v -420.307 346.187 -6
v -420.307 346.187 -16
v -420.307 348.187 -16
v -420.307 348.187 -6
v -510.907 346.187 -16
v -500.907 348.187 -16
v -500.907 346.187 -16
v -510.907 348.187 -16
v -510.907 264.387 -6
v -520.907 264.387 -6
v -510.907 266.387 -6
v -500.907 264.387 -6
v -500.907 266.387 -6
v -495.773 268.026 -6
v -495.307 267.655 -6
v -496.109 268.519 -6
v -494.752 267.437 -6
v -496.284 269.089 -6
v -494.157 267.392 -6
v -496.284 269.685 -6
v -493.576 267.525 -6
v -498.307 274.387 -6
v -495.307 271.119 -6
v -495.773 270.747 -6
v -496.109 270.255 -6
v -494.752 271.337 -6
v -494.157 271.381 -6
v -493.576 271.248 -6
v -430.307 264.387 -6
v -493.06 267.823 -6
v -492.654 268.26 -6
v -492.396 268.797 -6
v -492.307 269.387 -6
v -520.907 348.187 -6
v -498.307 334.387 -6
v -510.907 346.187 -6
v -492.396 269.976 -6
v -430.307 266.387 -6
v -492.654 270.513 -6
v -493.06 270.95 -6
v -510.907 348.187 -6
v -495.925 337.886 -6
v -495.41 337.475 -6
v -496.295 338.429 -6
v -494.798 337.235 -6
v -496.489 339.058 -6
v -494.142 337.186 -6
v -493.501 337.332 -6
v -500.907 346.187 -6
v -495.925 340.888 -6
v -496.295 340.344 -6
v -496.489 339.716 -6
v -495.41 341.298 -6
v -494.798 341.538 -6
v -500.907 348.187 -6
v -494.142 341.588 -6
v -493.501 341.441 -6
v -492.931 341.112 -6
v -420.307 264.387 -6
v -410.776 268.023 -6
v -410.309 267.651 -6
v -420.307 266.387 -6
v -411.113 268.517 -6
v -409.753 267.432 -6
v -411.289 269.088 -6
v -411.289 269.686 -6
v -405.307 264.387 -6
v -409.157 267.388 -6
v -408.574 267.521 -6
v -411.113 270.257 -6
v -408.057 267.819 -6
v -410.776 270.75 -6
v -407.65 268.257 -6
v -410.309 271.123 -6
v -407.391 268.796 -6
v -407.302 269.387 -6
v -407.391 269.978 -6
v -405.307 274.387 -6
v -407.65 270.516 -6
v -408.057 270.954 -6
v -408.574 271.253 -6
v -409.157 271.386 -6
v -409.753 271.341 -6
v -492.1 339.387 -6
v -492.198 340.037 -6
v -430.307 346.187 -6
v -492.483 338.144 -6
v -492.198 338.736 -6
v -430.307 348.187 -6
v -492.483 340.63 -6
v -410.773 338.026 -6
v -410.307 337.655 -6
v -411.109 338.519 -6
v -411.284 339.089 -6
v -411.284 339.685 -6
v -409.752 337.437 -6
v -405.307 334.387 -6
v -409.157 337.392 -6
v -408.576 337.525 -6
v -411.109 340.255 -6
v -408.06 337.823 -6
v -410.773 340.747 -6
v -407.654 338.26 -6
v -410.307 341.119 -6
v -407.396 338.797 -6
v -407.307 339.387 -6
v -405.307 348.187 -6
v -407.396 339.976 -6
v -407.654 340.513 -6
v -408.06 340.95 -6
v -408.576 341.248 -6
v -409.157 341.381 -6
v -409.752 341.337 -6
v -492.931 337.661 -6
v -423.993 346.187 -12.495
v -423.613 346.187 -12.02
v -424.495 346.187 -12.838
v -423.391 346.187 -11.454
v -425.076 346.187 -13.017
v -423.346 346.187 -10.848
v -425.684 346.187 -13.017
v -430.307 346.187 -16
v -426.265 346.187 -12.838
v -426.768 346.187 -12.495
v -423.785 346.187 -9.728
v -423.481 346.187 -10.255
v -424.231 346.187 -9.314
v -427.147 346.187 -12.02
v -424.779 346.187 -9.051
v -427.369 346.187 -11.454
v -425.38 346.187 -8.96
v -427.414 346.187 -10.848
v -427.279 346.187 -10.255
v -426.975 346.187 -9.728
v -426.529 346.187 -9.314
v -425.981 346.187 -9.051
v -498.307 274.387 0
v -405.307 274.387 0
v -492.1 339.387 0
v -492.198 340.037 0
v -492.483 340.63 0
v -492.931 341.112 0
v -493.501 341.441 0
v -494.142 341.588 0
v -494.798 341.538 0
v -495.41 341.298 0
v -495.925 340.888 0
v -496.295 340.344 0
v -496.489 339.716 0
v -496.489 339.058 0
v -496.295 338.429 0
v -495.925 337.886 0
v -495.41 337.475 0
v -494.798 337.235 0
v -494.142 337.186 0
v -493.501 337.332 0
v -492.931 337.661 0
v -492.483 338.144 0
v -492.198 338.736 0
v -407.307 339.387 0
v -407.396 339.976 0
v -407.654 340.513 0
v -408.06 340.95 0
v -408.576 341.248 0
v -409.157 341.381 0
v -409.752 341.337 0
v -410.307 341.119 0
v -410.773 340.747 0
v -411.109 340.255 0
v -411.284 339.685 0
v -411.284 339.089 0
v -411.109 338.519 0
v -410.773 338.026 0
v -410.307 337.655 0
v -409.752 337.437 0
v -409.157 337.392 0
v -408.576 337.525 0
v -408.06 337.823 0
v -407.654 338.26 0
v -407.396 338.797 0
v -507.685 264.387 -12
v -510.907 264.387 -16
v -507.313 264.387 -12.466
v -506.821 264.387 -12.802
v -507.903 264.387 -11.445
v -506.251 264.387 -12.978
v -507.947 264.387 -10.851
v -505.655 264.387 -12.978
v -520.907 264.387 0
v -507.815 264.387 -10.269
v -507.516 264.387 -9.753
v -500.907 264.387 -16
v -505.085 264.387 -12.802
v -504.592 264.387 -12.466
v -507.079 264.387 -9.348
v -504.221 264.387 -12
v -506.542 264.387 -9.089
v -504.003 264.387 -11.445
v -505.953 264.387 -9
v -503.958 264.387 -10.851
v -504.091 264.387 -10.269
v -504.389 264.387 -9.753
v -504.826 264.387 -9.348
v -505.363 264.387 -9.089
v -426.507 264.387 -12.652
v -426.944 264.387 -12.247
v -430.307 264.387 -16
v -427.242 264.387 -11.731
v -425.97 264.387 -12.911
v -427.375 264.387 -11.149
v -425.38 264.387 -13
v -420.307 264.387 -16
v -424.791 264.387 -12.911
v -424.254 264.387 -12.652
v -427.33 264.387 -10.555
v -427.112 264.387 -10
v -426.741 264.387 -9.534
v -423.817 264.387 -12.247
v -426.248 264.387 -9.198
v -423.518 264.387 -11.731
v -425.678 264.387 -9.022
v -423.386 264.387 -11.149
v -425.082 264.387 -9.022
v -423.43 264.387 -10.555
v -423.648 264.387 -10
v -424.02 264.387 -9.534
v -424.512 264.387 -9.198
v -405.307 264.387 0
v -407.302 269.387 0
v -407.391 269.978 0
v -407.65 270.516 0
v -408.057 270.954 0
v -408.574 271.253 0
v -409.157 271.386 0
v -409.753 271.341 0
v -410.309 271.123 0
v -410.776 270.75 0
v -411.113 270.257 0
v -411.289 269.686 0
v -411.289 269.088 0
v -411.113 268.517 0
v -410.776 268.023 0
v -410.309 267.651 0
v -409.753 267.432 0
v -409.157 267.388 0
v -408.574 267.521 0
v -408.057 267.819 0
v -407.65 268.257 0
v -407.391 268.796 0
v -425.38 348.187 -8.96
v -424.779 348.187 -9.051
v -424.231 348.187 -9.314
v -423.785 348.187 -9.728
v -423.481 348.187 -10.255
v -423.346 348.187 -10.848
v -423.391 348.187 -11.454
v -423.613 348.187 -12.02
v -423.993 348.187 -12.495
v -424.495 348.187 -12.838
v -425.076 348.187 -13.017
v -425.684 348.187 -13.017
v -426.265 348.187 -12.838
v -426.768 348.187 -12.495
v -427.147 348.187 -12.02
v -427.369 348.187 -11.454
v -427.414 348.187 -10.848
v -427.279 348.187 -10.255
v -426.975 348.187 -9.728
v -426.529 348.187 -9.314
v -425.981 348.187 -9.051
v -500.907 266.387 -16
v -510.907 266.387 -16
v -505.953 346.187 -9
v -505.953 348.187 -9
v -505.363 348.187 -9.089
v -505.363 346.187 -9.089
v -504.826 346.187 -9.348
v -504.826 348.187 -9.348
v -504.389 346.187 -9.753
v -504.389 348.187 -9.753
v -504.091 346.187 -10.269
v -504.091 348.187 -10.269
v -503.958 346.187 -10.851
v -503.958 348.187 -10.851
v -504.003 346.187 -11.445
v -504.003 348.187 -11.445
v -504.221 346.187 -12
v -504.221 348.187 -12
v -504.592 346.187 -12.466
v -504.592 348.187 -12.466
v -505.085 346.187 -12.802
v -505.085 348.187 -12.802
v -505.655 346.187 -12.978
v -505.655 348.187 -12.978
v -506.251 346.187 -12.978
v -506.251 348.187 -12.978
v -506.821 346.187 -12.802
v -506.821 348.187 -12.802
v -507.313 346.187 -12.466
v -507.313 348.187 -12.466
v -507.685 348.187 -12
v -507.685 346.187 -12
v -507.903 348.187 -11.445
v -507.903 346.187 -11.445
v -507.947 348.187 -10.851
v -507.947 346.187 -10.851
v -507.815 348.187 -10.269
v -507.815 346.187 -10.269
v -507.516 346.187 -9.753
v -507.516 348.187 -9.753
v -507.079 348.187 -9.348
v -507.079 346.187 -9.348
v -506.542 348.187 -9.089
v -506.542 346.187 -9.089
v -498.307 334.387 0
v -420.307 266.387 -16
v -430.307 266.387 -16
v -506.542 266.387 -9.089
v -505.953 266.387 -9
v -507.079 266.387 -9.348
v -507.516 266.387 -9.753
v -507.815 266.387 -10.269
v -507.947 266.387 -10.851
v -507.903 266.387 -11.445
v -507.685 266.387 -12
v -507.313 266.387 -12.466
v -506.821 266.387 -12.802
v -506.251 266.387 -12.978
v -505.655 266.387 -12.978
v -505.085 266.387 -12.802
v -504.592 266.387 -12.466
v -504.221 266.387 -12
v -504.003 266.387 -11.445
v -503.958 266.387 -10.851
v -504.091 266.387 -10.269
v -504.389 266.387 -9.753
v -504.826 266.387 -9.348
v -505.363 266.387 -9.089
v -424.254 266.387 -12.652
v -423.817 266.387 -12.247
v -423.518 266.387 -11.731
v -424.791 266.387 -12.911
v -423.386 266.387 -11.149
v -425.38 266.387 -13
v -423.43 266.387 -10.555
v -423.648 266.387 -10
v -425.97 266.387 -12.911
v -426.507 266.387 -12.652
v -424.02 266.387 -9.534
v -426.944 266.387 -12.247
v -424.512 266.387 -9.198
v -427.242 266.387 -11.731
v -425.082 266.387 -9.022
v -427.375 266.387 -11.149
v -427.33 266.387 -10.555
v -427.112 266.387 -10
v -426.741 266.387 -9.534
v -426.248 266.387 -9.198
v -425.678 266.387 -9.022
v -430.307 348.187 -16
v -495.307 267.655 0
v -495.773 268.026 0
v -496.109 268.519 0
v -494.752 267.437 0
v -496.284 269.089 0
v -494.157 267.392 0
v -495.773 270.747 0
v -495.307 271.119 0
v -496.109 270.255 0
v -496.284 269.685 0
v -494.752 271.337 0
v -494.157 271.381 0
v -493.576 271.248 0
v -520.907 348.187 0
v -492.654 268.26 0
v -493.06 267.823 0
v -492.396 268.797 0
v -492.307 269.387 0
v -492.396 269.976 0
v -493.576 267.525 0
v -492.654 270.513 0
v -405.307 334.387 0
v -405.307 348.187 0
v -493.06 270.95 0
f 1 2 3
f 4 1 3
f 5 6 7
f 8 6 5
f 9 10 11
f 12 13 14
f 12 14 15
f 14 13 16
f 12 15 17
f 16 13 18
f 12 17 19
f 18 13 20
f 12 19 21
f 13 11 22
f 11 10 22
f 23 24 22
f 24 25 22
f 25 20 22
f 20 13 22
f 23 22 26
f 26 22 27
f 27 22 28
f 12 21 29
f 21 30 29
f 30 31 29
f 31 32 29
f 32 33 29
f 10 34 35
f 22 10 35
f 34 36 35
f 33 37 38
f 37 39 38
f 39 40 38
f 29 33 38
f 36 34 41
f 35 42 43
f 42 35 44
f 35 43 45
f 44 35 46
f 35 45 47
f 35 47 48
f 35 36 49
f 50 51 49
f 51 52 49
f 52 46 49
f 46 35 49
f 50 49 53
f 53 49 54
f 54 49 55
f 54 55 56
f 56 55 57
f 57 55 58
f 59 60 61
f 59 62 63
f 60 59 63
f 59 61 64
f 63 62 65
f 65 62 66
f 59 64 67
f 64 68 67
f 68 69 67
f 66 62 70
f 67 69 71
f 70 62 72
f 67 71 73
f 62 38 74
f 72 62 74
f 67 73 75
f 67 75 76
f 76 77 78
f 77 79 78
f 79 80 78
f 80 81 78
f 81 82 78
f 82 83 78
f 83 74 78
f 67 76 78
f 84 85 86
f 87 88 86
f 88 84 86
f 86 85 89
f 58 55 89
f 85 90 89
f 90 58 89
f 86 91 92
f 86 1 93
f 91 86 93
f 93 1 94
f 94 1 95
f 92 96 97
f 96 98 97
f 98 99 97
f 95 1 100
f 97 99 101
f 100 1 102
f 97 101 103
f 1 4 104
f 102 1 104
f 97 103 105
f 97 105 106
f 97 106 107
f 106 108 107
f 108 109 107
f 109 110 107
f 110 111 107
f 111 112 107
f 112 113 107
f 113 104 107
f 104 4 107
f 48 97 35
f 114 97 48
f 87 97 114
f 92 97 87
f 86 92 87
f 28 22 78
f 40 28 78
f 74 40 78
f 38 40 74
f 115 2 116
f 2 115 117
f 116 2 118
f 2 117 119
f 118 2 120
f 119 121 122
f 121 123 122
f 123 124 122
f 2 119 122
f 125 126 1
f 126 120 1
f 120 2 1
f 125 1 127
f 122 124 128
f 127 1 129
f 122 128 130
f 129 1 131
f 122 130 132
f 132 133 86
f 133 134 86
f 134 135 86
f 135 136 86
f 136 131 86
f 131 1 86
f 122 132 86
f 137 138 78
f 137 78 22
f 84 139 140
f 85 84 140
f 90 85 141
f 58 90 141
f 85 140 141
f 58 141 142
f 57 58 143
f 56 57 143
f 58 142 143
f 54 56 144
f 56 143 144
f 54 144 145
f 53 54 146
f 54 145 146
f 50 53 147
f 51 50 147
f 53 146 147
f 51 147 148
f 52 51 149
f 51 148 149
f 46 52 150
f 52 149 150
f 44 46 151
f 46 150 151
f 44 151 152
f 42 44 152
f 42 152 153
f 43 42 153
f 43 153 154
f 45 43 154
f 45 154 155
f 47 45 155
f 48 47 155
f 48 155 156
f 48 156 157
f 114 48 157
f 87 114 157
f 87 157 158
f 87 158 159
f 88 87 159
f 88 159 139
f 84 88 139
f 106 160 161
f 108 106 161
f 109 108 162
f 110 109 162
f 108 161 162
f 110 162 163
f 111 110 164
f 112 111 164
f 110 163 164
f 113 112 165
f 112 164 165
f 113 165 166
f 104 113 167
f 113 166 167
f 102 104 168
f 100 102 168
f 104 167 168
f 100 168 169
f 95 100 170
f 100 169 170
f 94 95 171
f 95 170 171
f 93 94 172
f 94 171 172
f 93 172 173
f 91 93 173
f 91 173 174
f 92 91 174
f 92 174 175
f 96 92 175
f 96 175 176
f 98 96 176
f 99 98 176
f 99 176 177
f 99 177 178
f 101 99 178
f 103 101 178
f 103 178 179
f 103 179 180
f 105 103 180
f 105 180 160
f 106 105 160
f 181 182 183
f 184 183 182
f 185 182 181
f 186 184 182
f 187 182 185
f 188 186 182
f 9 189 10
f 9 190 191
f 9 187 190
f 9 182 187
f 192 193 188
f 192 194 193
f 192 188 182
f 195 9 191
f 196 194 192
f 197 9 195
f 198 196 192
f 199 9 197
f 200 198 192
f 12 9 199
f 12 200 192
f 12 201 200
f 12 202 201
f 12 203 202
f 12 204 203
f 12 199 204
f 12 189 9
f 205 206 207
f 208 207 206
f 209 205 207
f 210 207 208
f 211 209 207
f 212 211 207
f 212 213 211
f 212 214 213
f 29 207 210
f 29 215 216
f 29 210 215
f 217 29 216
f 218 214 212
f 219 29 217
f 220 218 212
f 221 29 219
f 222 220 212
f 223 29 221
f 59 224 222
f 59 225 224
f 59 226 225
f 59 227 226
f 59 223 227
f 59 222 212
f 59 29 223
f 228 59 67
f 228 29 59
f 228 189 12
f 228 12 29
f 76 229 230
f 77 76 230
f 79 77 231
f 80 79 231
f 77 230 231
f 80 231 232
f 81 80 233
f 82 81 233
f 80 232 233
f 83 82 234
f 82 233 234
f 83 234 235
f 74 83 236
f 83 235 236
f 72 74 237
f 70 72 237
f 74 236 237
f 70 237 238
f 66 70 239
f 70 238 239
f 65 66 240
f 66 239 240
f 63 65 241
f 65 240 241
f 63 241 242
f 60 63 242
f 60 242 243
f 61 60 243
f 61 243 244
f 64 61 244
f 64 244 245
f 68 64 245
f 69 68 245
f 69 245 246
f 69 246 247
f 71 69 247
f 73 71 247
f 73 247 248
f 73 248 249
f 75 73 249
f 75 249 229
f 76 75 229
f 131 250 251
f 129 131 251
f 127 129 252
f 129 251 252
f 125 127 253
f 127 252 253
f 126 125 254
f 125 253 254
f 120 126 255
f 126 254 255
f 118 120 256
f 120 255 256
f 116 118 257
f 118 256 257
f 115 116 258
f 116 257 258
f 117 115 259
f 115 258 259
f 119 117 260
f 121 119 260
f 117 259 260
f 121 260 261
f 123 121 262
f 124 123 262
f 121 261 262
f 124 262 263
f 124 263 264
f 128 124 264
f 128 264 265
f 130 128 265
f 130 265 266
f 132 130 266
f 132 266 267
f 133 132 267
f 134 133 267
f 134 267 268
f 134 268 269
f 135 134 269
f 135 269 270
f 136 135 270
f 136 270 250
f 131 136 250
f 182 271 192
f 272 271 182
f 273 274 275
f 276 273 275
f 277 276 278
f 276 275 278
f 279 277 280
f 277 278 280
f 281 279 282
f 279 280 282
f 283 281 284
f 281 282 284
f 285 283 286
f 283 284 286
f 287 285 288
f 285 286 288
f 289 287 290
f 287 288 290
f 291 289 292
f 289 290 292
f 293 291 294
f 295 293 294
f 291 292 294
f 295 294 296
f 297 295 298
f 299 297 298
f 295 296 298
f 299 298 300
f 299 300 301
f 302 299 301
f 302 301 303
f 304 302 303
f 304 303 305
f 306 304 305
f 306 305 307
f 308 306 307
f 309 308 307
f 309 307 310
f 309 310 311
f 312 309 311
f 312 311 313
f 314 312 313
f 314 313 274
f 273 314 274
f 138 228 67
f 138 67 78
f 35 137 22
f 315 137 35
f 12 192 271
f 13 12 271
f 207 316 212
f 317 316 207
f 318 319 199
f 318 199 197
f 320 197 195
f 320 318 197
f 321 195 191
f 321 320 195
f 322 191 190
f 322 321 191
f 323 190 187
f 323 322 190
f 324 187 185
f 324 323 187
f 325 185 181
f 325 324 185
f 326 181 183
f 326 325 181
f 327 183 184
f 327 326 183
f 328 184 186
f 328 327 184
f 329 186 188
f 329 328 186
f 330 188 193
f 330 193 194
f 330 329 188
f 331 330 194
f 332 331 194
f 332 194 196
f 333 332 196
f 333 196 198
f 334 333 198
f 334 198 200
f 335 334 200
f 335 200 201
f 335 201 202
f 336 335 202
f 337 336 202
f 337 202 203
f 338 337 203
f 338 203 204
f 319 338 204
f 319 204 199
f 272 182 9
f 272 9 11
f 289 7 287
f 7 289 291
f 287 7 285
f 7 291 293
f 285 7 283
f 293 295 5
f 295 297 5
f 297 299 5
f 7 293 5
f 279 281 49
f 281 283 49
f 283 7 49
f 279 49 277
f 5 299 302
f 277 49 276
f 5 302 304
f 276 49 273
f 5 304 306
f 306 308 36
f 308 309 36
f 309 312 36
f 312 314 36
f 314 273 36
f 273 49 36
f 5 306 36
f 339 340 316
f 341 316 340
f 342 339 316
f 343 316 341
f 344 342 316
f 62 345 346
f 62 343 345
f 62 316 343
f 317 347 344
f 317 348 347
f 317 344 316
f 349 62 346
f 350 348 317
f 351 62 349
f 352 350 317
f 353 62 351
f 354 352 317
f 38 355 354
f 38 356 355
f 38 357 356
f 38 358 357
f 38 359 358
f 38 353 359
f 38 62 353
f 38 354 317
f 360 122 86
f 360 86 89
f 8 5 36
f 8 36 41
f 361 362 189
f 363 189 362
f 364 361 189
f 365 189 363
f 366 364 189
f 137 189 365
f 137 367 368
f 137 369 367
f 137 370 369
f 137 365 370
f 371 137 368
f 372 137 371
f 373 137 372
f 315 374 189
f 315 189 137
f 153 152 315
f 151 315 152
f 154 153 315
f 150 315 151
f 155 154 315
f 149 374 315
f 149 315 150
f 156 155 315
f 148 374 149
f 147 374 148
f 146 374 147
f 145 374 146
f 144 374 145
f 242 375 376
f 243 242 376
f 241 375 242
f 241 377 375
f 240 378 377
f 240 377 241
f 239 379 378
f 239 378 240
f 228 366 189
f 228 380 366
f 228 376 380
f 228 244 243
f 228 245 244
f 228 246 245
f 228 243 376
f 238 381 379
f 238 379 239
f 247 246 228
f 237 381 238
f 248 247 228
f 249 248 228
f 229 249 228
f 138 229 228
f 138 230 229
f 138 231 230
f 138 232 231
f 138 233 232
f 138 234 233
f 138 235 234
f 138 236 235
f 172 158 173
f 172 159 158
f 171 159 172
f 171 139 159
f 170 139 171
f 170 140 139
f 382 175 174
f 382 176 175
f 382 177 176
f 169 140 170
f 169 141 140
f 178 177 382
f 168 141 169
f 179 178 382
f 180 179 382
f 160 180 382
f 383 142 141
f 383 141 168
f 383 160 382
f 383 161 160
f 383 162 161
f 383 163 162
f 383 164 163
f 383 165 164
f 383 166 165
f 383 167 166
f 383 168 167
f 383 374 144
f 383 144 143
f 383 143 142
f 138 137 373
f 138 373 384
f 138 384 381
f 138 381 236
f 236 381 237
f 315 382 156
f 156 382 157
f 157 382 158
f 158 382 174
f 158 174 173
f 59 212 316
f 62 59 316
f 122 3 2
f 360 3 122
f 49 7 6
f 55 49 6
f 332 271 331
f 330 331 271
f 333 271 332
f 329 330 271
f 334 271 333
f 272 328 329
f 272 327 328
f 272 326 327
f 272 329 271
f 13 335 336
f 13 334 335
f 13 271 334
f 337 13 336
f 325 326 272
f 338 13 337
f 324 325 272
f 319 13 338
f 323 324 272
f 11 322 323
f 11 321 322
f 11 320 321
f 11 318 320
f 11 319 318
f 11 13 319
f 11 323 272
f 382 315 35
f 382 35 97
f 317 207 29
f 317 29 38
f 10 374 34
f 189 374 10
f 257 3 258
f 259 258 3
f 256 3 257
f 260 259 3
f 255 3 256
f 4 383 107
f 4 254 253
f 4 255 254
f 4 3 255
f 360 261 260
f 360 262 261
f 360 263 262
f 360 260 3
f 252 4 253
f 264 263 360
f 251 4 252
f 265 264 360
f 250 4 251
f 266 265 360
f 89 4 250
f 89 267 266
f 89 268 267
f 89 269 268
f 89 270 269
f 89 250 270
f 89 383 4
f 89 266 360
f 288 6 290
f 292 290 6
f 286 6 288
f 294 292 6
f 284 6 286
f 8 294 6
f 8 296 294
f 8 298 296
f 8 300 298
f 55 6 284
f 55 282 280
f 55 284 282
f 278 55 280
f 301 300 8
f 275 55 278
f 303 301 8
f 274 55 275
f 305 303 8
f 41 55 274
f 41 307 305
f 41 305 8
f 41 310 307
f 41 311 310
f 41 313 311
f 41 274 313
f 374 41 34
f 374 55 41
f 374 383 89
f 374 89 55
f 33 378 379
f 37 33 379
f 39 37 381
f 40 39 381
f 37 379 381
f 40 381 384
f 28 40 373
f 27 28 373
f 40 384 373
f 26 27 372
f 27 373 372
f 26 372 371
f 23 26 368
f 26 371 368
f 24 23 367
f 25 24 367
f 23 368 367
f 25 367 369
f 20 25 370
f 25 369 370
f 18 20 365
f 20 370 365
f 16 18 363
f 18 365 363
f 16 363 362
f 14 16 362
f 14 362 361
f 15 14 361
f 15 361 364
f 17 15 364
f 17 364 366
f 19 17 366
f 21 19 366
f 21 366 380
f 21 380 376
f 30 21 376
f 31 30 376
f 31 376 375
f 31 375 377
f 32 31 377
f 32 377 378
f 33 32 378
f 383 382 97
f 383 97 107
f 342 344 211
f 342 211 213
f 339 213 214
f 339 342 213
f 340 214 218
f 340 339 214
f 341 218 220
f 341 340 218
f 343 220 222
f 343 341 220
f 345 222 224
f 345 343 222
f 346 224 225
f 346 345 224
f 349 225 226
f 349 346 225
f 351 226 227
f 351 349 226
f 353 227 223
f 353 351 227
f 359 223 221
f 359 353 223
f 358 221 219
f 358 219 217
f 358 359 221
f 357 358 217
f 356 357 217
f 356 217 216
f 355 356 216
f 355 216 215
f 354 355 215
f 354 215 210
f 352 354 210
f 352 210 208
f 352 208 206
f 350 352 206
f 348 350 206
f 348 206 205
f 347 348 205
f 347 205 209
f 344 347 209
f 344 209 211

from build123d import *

# Parameters (mm, degrees)
EXTRUDE_1_DEPTH     = 6
SKETCH_2_W          = 10
SKETCH_2_H          = 2
EXTRUDE_2_DEPTH     = 10
SKETCH_3_W          = 10
SKETCH_3_H          = 2
EXTRUDE_3_DEPTH     = 10
SKETCH_4_R          = 2.040020597
SKETCH_4_R_2        = 2
CUT_EXTRUDE_1_DEPTH = 9
CUT_EXTRUDE_START   = -9
SKETCH_5_R          = 2
CUT_EXTRUDE_2_DEPTH = 9
SKETCH_7_R          = 2.206948318
SKETCH_7_R_2        = 2
SKETCH_7_R_3        = 2.004801963
CUT_EXTRUDE_3_DEPTH = 9


with BuildPart() as part:
    # 草图1 → 凸台-拉伸1 (new body)
    with BuildSketch(Plane.XY):
        Polygon((-405.306796117, 348.186737633), (-520.906796117, 348.186737633), (-520.906796117, 264.386737633), (-405.306796117, 264.386737633), (-405.306796117, 274.386737633), (-498.306796117, 274.386737633), (-498.306796117, 334.386737633), (-405.306796117, 334.386737633), align=None)
    extrude(amount=-EXTRUDE_1_DEPTH)

    # 草图2 → 凸台-拉伸2 (add)
    with BuildSketch(Plane(origin=(0, 0, -6), x_dir=(-1, 0, 0), z_dir=(0, 0, -1))):
        with Locations((505.906796117, 347.186737633)):
            Rectangle(SKETCH_2_W, SKETCH_2_H)
        with Locations((505.906796117, 265.386737633)):
            Rectangle(SKETCH_2_W, SKETCH_2_H)
    extrude(amount=EXTRUDE_2_DEPTH)

    # 草图3 → 凸台-拉伸3 (add)
    with BuildSketch(Plane(origin=(0, 0, -6), x_dir=(-1, 0, 0), z_dir=(0, 0, -1))):
        with Locations((425.306796117, 347.186737633)):
            Rectangle(SKETCH_3_W, SKETCH_3_H)
        with Locations((425.306796117, 265.386737633)):
            Rectangle(SKETCH_3_W, SKETCH_3_H)
    extrude(amount=EXTRUDE_3_DEPTH)

    # 草图4 → 切除-拉伸1 (cut)
    with BuildSketch(Plane(origin=(0, 348.186737633, 0), x_dir=(1, 0, 0), z_dir=(0, 1, 0))):
        with Locations(Location((-425.380170541, 11, 0), (0, 0, 270))):
            Circle(SKETCH_4_R)
        with Locations(Location((-505.95276467, 11, 0), (0, 0, 270))):
            Circle(SKETCH_4_R_2)
    extrude(amount=-CUT_EXTRUDE_1_DEPTH, mode=Mode.SUBTRACT)

    # 草图5 → 切除-拉伸2 (cut)
    with BuildSketch(Plane.XZ.offset(-264.386737633).offset(CUT_EXTRUDE_START)):
        with Locations(Location((-505.95276467, -11, 0), (0, 0, 90))):
            Circle(SKETCH_5_R)
        with Locations(Location((-425.380170541, -11, 0), (0, 0, 270))):
            Circle(SKETCH_5_R)
    extrude(amount=CUT_EXTRUDE_2_DEPTH, mode=Mode.SUBTRACT)

    # 草图7 → 切除-拉伸3 (cut)
    with BuildSketch(Plane.XY):
        with Locations((-494.306796117, 339.386737633)):
            Circle(SKETCH_7_R)
        with Locations((-409.306796117, 339.386737633)):
            Circle(SKETCH_7_R_2)
        with Locations((-409.306796117, 269.386737633)):
            Circle(SKETCH_7_R_3)
        with Locations((-494.306796117, 269.386737633)):
            Circle(SKETCH_7_R_2)
    extrude(amount=-CUT_EXTRUDE_3_DEPTH, mode=Mode.SUBTRACT)


solid = part.part
